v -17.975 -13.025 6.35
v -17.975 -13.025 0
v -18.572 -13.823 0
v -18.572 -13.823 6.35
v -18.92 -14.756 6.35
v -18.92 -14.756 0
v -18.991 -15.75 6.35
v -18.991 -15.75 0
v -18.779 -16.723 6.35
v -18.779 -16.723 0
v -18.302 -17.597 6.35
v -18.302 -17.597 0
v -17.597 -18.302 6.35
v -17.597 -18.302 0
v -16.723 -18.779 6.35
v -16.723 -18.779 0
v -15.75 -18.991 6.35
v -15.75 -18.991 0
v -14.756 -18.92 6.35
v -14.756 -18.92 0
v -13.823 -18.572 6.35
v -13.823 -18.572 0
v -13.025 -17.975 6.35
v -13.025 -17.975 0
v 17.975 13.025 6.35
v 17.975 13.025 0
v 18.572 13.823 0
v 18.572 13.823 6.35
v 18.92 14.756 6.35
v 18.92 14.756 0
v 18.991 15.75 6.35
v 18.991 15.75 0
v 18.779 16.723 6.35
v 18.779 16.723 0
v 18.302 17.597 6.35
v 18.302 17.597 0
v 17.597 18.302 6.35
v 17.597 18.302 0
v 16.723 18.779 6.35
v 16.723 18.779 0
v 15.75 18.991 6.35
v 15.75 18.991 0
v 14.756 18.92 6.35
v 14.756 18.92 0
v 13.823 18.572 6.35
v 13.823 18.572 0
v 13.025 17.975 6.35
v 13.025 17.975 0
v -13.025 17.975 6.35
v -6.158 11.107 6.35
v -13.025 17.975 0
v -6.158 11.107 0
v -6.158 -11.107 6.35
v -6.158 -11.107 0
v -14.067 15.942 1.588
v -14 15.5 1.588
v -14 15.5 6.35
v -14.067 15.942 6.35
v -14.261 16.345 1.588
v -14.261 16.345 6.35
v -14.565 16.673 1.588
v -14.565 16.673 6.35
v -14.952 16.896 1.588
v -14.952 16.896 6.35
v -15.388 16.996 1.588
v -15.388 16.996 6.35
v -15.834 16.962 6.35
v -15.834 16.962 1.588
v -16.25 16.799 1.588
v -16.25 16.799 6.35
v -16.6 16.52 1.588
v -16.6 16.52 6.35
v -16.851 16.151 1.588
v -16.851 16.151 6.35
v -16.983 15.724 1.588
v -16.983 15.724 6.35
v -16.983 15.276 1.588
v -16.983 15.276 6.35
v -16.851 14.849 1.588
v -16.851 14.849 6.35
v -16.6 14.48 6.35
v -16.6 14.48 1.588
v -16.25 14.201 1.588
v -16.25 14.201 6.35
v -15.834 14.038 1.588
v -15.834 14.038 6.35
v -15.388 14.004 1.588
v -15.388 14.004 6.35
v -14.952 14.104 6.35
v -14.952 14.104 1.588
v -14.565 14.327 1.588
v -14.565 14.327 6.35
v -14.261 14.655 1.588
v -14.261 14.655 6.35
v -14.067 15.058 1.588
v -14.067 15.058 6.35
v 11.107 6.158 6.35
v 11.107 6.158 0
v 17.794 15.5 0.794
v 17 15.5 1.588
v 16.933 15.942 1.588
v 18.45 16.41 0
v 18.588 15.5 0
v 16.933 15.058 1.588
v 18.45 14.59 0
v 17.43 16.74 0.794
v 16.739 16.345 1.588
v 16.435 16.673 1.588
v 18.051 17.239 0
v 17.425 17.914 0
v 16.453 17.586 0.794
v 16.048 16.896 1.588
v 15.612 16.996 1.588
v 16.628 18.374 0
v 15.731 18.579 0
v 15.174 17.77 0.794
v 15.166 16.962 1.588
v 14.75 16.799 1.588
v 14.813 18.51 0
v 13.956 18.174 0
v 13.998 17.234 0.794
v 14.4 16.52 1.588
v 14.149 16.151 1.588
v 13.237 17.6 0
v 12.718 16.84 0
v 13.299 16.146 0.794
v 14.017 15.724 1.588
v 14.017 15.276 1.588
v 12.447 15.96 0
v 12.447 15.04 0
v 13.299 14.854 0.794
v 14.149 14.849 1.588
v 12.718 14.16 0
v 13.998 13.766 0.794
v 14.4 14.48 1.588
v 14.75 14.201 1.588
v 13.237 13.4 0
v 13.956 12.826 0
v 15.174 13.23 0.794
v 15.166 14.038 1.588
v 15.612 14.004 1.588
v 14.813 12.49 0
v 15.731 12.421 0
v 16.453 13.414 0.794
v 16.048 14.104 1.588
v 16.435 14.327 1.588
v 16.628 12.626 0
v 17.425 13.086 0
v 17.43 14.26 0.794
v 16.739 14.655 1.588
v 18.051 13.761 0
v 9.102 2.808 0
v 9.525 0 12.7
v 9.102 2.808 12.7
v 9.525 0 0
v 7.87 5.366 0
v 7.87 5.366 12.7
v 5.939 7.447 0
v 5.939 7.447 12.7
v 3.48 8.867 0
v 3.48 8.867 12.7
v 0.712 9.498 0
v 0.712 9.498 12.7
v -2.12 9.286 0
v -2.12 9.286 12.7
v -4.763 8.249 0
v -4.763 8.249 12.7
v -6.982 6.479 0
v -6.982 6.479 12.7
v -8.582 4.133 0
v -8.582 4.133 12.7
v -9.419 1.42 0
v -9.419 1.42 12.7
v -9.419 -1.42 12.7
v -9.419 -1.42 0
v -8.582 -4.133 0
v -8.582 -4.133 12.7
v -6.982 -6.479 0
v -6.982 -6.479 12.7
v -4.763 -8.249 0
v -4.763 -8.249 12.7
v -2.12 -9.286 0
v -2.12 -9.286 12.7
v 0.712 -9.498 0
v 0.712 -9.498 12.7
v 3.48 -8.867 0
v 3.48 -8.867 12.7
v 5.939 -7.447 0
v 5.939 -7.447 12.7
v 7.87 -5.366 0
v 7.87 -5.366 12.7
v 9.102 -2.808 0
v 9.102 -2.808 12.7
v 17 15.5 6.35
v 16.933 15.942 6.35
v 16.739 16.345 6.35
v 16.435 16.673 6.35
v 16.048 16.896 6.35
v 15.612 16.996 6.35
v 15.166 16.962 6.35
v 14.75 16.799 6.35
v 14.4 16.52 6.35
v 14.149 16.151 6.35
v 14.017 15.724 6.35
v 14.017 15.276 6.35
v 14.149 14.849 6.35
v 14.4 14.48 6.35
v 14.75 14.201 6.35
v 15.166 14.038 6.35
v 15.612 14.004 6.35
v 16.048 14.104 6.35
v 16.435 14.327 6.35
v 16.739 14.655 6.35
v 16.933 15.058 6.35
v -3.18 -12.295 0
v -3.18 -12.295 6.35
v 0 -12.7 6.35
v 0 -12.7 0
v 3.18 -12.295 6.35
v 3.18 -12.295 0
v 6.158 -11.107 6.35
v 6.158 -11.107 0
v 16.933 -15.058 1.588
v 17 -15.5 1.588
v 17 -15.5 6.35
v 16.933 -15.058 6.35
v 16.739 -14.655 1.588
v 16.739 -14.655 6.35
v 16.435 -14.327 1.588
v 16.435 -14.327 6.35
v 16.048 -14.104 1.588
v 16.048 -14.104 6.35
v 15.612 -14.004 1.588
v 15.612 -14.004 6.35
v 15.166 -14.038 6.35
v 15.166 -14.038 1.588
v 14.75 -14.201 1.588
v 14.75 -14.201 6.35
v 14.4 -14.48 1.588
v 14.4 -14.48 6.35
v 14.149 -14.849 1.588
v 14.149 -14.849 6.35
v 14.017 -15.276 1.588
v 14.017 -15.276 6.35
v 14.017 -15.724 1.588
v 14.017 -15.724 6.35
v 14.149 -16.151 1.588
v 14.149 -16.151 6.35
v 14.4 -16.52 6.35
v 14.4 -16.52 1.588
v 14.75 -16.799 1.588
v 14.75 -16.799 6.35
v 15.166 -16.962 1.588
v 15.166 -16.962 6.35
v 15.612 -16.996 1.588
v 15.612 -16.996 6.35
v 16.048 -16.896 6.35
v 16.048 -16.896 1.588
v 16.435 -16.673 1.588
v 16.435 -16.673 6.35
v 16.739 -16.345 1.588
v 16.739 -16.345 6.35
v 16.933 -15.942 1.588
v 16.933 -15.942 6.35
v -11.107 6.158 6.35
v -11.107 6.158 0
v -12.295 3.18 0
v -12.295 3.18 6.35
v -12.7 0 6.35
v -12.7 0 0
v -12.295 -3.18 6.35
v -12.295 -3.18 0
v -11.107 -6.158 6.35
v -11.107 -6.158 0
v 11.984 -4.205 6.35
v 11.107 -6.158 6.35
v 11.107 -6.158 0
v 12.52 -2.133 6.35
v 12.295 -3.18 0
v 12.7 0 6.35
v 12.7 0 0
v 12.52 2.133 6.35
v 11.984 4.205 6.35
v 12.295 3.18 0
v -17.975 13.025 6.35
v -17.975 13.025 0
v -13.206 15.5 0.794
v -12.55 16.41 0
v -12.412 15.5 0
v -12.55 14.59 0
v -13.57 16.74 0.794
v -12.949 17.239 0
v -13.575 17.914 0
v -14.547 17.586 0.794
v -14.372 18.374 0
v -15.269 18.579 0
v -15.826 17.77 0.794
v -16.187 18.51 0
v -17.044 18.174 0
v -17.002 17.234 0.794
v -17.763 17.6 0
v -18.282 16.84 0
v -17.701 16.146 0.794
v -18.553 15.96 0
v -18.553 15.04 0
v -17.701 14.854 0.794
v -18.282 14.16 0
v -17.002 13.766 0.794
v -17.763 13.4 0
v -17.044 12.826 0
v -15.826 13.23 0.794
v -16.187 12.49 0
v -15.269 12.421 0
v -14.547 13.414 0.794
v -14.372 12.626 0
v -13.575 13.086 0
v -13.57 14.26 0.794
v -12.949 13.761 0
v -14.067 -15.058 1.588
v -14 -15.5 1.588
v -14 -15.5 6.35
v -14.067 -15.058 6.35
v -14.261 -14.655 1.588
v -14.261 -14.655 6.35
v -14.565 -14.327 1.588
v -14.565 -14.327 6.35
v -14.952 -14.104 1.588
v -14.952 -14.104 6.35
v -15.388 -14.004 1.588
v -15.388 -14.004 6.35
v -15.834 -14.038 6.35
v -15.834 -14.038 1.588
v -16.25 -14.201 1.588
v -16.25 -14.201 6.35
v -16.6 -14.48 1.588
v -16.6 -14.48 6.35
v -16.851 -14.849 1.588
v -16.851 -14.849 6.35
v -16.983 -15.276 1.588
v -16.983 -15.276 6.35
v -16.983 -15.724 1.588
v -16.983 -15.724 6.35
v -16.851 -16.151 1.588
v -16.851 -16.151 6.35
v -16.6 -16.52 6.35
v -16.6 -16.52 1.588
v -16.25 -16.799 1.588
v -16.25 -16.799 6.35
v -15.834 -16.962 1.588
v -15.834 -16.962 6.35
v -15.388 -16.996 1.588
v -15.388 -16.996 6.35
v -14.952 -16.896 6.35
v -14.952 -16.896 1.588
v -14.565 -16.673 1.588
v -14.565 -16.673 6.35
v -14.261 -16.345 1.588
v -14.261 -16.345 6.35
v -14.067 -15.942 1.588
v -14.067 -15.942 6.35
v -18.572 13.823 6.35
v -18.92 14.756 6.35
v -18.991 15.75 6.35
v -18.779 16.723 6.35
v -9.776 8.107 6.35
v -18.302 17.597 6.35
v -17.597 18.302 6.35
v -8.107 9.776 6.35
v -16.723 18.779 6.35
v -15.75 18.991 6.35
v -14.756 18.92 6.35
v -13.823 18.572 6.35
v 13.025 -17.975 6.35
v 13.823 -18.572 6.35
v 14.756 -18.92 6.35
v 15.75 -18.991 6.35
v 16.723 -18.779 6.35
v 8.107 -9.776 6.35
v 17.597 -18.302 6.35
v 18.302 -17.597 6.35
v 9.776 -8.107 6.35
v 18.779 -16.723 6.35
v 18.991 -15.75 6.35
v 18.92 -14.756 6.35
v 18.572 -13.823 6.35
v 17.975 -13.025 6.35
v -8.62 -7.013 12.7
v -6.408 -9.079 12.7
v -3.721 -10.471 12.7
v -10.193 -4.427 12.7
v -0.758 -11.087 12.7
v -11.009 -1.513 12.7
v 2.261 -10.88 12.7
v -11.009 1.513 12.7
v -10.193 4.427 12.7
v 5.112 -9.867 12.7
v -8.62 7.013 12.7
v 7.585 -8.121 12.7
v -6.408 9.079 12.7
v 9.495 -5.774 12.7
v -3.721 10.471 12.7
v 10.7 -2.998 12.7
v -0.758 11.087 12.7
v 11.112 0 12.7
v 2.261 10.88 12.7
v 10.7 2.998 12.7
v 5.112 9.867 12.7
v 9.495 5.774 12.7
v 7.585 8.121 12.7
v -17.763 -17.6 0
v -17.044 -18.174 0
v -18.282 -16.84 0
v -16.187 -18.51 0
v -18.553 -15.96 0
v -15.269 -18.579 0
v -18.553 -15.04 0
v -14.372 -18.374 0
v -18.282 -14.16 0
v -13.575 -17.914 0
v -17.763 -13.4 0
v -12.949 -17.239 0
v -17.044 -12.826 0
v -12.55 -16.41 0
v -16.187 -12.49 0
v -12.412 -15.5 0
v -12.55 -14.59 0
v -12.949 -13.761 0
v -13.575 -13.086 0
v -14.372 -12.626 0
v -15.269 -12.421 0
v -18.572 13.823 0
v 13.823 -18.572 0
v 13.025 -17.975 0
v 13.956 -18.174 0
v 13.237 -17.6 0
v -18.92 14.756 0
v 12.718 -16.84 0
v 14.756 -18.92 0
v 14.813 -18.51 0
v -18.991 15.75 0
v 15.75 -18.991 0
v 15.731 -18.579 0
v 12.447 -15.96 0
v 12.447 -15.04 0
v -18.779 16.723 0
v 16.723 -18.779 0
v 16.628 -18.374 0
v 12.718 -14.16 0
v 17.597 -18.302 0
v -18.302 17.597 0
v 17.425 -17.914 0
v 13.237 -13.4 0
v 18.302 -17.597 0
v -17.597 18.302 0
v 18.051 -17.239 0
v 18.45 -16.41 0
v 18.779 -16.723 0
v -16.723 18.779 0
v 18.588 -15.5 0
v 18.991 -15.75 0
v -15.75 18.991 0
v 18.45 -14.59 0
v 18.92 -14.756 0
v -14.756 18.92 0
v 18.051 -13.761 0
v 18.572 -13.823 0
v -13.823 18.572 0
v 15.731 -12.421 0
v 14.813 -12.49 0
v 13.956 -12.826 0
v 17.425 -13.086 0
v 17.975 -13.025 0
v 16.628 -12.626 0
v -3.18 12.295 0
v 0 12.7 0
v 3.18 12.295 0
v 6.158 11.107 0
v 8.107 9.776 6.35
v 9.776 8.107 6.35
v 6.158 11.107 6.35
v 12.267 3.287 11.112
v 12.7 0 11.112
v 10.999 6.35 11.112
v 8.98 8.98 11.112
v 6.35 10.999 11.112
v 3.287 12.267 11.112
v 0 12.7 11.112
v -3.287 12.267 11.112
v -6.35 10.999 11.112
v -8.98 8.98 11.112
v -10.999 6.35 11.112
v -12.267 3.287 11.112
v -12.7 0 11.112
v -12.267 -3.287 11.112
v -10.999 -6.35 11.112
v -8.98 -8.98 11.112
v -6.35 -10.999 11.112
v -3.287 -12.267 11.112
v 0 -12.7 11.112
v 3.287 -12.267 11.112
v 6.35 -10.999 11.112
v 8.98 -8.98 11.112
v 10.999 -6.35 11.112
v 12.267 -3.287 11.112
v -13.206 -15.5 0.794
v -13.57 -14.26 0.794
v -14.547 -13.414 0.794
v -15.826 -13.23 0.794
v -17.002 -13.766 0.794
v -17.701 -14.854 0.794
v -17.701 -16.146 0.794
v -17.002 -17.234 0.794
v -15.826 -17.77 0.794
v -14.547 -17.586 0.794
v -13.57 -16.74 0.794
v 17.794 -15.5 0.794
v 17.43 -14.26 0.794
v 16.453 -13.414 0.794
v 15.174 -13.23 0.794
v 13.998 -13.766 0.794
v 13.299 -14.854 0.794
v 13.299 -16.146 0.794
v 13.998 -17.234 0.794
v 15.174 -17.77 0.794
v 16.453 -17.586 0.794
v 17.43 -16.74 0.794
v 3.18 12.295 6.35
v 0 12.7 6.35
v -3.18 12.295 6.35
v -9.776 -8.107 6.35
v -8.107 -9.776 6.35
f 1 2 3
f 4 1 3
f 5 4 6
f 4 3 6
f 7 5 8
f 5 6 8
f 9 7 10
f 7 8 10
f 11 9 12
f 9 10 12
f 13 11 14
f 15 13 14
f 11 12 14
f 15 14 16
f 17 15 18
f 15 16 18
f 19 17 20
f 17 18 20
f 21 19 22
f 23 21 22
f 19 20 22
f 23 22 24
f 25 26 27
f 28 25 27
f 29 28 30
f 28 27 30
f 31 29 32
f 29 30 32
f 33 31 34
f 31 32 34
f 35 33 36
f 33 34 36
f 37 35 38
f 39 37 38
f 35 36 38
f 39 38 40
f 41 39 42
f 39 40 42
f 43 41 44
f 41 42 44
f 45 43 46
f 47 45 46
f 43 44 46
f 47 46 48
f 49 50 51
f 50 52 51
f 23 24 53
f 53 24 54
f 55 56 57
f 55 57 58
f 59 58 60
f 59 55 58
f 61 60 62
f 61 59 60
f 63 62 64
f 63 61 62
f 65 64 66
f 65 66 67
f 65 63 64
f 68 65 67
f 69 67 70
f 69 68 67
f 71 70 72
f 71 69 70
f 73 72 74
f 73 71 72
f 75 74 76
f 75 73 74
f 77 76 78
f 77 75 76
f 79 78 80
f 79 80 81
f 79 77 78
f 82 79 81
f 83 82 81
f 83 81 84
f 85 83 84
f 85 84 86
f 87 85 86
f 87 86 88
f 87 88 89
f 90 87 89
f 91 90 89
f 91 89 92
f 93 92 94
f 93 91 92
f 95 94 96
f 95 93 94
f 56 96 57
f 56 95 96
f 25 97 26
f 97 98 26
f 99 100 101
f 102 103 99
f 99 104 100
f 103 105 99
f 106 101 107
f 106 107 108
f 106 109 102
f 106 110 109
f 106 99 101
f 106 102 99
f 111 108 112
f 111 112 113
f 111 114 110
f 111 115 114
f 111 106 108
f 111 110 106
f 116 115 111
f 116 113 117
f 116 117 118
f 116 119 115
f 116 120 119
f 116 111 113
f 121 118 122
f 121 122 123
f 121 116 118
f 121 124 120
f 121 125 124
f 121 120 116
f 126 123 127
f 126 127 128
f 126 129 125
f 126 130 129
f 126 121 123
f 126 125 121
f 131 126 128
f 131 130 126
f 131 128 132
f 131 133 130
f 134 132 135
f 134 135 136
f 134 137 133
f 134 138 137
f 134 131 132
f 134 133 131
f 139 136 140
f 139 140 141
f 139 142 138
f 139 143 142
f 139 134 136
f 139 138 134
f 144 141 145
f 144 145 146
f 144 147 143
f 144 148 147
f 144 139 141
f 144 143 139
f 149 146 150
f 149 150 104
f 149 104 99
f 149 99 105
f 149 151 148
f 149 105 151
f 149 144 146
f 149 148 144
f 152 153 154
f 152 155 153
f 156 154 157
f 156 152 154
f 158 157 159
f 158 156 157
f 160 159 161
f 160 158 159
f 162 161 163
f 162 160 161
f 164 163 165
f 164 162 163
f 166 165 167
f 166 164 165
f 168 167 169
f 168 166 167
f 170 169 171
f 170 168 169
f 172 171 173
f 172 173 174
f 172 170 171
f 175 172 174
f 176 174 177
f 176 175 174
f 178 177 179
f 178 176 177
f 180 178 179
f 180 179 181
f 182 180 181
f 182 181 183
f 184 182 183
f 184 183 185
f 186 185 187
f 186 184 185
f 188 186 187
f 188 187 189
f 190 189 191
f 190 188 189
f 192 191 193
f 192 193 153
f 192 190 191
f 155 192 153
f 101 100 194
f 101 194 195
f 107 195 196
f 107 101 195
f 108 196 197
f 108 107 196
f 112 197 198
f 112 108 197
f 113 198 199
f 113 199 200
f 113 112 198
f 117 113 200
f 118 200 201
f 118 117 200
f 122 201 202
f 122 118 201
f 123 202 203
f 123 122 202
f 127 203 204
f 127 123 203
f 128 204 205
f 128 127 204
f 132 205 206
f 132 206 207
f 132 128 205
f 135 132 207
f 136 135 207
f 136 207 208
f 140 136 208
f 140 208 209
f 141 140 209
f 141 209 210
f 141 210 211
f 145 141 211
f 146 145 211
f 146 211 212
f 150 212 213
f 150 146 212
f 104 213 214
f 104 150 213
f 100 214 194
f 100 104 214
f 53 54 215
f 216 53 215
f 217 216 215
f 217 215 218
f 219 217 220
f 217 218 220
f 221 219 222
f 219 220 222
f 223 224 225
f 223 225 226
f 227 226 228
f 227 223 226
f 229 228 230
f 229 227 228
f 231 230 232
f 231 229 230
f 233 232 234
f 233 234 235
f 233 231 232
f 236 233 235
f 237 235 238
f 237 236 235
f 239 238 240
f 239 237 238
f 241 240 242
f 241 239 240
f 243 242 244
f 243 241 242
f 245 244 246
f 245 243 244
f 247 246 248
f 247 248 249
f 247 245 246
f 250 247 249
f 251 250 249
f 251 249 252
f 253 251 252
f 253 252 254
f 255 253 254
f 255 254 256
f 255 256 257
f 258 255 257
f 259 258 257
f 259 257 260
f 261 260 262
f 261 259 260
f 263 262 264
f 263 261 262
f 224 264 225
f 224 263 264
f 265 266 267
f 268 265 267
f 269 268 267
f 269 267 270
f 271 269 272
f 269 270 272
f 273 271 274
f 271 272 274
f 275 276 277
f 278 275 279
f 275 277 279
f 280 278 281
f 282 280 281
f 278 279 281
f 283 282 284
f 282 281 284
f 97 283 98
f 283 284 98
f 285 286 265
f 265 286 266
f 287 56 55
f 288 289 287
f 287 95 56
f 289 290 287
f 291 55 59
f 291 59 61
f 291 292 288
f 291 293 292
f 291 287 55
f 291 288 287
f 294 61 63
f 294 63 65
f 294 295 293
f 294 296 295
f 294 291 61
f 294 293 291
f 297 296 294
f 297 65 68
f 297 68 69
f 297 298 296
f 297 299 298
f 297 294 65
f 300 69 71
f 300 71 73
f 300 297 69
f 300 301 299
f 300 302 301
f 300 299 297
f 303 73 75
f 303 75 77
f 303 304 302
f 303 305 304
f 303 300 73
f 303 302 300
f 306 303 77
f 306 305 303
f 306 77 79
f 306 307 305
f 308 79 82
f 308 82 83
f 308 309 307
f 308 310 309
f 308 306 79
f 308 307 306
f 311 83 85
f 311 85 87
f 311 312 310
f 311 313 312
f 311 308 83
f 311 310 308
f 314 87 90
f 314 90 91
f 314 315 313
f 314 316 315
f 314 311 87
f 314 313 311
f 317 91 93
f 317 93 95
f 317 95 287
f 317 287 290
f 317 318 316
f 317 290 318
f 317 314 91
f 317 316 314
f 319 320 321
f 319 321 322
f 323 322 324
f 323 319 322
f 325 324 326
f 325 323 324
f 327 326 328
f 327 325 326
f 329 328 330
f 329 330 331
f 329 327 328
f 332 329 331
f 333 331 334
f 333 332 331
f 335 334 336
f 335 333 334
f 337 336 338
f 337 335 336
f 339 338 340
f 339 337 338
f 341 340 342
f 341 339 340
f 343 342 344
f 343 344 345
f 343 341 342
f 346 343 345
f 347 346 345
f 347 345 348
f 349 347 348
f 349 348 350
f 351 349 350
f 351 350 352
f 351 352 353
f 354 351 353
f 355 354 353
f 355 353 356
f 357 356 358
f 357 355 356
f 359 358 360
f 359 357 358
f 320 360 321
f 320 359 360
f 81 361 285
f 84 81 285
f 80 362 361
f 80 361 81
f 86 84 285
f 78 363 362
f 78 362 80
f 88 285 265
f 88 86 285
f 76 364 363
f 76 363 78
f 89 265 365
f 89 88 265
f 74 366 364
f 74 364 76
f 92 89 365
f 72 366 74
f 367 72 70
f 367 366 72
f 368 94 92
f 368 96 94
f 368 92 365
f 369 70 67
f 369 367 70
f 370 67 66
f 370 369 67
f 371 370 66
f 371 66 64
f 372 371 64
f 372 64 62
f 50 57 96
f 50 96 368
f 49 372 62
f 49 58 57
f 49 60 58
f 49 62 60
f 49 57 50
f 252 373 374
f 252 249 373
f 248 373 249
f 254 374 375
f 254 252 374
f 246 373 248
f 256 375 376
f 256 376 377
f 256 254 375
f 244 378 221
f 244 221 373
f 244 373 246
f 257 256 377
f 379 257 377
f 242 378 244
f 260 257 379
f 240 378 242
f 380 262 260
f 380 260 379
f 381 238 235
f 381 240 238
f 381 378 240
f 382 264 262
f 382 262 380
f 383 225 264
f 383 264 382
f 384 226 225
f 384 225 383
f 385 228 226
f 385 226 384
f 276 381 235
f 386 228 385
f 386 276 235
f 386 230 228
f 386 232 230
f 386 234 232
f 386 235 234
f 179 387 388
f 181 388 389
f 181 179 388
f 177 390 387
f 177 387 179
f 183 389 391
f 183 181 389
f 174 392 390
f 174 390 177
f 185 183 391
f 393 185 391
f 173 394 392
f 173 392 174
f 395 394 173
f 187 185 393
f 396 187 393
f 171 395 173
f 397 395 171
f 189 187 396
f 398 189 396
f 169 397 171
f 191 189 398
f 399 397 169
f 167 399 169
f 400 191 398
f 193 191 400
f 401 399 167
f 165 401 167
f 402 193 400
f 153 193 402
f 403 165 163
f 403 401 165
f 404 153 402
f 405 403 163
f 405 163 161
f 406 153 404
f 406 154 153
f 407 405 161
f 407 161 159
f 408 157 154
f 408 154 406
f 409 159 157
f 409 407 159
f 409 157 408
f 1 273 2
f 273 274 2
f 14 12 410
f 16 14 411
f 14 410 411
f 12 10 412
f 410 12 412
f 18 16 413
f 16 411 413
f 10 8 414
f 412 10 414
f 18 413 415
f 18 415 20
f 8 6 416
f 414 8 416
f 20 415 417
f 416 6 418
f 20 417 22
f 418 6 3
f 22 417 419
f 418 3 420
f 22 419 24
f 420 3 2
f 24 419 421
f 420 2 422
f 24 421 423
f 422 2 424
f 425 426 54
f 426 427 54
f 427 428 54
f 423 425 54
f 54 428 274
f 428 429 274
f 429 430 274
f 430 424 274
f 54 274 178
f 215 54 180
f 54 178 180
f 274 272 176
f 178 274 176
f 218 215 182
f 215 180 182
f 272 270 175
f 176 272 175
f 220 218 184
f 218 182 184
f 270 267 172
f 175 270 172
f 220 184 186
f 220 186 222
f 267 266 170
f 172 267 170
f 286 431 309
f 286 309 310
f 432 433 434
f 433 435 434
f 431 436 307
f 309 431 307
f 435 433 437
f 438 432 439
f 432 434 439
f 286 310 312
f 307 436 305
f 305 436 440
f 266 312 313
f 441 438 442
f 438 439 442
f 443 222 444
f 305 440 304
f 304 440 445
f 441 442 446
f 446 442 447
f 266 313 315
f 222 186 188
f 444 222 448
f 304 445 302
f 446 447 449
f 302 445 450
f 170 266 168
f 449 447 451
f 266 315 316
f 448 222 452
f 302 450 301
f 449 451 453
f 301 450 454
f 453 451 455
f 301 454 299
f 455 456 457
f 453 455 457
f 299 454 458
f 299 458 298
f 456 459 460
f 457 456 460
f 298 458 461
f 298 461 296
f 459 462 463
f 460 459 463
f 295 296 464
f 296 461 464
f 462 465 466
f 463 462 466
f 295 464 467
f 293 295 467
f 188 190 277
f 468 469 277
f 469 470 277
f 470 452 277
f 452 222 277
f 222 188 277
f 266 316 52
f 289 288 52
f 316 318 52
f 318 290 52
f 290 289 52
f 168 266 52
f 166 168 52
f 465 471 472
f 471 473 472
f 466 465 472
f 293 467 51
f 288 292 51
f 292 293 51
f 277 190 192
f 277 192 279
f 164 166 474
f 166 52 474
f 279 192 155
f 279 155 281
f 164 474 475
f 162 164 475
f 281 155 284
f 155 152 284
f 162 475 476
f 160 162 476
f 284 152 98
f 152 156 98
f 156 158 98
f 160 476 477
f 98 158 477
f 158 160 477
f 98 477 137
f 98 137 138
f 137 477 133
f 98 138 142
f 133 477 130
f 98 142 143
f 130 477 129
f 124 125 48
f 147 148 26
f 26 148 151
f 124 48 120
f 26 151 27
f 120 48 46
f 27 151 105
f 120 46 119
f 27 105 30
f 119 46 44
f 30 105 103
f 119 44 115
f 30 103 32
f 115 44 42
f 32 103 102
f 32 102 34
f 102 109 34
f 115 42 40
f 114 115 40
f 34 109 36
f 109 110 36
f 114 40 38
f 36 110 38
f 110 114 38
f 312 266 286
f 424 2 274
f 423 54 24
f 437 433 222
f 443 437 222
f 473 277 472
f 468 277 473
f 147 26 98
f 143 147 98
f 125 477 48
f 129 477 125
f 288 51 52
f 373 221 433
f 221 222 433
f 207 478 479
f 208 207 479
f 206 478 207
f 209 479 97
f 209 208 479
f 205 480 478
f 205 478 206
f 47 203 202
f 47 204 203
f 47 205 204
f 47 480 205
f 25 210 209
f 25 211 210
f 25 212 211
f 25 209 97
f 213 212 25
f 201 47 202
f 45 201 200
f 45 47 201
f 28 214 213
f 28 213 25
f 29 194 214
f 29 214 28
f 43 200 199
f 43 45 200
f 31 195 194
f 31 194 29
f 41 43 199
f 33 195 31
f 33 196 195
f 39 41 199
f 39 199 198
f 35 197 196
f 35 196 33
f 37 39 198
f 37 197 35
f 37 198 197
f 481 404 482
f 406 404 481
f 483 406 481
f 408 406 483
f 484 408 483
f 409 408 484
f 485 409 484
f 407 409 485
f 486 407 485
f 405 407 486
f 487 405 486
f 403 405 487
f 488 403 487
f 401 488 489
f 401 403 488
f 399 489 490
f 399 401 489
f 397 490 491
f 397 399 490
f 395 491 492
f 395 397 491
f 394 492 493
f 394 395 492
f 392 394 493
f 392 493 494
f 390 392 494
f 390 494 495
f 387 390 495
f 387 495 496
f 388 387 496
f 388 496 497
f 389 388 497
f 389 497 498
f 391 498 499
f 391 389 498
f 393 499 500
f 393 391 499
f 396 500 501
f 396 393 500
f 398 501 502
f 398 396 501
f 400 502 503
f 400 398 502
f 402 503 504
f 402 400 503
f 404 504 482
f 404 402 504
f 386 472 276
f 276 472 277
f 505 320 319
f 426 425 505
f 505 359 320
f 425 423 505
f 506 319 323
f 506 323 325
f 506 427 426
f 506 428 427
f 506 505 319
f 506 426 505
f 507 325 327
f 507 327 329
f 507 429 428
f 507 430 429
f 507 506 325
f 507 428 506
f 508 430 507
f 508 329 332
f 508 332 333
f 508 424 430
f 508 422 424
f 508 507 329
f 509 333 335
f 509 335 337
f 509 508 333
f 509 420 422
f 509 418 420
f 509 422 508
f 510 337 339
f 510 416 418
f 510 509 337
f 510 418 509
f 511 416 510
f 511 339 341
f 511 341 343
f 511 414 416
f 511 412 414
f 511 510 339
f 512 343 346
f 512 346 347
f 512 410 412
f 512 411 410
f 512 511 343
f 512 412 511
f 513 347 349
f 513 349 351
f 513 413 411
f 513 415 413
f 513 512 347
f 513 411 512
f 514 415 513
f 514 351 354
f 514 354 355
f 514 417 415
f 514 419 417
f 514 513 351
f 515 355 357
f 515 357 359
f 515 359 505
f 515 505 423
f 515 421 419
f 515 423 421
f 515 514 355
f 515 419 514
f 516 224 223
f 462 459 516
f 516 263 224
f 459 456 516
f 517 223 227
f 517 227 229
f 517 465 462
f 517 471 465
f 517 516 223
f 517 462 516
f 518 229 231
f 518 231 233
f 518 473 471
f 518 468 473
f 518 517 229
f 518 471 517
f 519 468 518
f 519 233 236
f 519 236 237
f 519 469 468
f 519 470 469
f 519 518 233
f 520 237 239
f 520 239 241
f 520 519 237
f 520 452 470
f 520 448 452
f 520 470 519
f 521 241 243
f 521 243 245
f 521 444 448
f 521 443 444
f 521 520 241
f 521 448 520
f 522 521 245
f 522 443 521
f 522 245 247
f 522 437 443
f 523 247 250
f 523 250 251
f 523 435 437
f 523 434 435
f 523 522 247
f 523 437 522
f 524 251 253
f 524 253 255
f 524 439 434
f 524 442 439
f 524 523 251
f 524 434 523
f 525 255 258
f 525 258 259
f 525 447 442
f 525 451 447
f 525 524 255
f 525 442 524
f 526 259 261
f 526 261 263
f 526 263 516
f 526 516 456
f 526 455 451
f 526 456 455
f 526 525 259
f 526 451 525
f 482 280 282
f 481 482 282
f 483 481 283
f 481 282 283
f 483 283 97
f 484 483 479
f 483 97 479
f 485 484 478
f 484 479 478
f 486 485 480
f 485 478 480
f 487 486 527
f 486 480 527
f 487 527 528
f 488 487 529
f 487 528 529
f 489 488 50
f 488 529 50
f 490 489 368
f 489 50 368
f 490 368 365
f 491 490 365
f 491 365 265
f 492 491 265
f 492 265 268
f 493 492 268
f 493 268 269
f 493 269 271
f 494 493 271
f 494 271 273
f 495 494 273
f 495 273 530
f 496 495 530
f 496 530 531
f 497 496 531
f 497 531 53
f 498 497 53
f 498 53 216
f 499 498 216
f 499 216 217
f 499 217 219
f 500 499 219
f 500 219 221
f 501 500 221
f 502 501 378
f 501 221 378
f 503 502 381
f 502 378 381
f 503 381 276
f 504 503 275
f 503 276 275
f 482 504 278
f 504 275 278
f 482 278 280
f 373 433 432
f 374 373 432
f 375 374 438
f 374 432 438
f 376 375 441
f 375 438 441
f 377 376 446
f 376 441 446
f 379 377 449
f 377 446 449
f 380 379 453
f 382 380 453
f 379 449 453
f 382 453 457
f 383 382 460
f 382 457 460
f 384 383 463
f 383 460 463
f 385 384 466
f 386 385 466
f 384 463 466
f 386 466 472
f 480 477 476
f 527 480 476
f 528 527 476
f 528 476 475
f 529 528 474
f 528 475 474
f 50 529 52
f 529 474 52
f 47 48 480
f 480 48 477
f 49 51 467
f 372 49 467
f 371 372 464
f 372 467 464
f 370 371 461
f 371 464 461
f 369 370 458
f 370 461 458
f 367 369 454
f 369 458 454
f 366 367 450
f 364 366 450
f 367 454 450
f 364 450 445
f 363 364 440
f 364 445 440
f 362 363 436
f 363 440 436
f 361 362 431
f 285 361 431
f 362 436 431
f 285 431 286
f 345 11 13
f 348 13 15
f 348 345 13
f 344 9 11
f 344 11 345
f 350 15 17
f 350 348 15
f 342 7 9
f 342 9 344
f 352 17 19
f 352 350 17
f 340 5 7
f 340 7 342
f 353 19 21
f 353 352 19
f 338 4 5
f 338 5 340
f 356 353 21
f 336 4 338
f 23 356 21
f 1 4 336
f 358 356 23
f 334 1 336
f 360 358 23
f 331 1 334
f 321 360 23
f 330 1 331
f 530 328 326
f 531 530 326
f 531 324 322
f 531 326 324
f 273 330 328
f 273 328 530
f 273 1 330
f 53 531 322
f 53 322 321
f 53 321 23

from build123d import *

# Parameters (mm, degrees)
F0_R     = 1.5
F0_R_2   = 9.525
F1_DEPTH = 6.35
F2_SIZE  = 1.5875
F3_R     = 12.7
F3_R_2   = 9.525
F4_DEPTH = 6.35
F5_SIZE  = 1.5875


with BuildPart() as f1:
    # F0 (on Top) → F1 (new body)
    with BuildSketch(Plane.XY):
        with BuildLine():
            Line((-17.974874, 13.025126), (-11.10737, 6.157623))
            ThreePointArc((-11.10737, 6.157623), (-12.7, 0), (-11.10737, -6.157623))
            Line((-11.10737, -6.157623), (-17.974874, -13.025126))
            ThreePointArc((-17.974874, -13.025126), (-17.974874, -17.974874), (-13.025126, -17.974874))
            Line((-13.025126, -17.974874), (-6.157623, -11.10737))
            ThreePointArc((-6.157623, -11.10737), (0, -12.7), (6.157623, -11.10737))
            Line((6.157623, -11.10737), (13.025126, -17.974874))
            ThreePointArc((13.025126, -17.974874), (17.974874, -17.974874), (17.974874, -13.025126))
            Line((17.974874, -13.025126), (11.10737, -6.157623))
            ThreePointArc((11.10737, -6.157623), (12.7, 0), (11.10737, 6.157623))
            Line((11.10737, 6.157623), (17.974874, 13.025126))
            ThreePointArc((17.974874, 13.025126), (17.974874, 17.974874), (13.025126, 17.974874))
            Line((13.025126, 17.974874), (6.157623, 11.10737))
            ThreePointArc((6.157623, 11.10737), (0, 12.7), (-6.157623, 11.10737))
            Line((-6.157623, 11.10737), (-13.025126, 17.974874))
            ThreePointArc((-13.025126, 17.974874), (-17.974874, 17.974874), (-17.974874, 13.025126))
        make_face()
        with Locations((-15.5, -15.5)):
            Circle(F0_R, mode=Mode.SUBTRACT)
        with Locations((15.5, -15.5)):
            Circle(F0_R, mode=Mode.SUBTRACT)
        with Locations((-15.5, 15.5)):
            Circle(F0_R, mode=Mode.SUBTRACT)
        Circle(F0_R_2, mode=Mode.SUBTRACT)
        with Locations((15.5, 15.5)):
            Circle(F0_R, mode=Mode.SUBTRACT)
    extrude(amount=F1_DEPTH)

    # F2
    f2_edges = [f1.edges().sort_by_distance(p)[0] for p in [
        (-17, -15.5, 0),
        (14, -15.5, 0),
        (14, 15.5, 0),
        (-17, 15.5, 0),
    ]]
    chamfer(f2_edges, length=F2_SIZE)

    # F3 (on face) → F4 (join)
    with BuildSketch(Plane.XY.offset(6.35)):
        Circle(F3_R)
        Circle(F3_R_2, mode=Mode.SUBTRACT)
    extrude(amount=F4_DEPTH)

    # F5
    f5_edges = [f1.edges().sort_by_distance(p)[0] for p in [
        (-12.7, 0, 12.7),
    ]]
    chamfer(f5_edges, length=F5_SIZE)


solid = f1.part
